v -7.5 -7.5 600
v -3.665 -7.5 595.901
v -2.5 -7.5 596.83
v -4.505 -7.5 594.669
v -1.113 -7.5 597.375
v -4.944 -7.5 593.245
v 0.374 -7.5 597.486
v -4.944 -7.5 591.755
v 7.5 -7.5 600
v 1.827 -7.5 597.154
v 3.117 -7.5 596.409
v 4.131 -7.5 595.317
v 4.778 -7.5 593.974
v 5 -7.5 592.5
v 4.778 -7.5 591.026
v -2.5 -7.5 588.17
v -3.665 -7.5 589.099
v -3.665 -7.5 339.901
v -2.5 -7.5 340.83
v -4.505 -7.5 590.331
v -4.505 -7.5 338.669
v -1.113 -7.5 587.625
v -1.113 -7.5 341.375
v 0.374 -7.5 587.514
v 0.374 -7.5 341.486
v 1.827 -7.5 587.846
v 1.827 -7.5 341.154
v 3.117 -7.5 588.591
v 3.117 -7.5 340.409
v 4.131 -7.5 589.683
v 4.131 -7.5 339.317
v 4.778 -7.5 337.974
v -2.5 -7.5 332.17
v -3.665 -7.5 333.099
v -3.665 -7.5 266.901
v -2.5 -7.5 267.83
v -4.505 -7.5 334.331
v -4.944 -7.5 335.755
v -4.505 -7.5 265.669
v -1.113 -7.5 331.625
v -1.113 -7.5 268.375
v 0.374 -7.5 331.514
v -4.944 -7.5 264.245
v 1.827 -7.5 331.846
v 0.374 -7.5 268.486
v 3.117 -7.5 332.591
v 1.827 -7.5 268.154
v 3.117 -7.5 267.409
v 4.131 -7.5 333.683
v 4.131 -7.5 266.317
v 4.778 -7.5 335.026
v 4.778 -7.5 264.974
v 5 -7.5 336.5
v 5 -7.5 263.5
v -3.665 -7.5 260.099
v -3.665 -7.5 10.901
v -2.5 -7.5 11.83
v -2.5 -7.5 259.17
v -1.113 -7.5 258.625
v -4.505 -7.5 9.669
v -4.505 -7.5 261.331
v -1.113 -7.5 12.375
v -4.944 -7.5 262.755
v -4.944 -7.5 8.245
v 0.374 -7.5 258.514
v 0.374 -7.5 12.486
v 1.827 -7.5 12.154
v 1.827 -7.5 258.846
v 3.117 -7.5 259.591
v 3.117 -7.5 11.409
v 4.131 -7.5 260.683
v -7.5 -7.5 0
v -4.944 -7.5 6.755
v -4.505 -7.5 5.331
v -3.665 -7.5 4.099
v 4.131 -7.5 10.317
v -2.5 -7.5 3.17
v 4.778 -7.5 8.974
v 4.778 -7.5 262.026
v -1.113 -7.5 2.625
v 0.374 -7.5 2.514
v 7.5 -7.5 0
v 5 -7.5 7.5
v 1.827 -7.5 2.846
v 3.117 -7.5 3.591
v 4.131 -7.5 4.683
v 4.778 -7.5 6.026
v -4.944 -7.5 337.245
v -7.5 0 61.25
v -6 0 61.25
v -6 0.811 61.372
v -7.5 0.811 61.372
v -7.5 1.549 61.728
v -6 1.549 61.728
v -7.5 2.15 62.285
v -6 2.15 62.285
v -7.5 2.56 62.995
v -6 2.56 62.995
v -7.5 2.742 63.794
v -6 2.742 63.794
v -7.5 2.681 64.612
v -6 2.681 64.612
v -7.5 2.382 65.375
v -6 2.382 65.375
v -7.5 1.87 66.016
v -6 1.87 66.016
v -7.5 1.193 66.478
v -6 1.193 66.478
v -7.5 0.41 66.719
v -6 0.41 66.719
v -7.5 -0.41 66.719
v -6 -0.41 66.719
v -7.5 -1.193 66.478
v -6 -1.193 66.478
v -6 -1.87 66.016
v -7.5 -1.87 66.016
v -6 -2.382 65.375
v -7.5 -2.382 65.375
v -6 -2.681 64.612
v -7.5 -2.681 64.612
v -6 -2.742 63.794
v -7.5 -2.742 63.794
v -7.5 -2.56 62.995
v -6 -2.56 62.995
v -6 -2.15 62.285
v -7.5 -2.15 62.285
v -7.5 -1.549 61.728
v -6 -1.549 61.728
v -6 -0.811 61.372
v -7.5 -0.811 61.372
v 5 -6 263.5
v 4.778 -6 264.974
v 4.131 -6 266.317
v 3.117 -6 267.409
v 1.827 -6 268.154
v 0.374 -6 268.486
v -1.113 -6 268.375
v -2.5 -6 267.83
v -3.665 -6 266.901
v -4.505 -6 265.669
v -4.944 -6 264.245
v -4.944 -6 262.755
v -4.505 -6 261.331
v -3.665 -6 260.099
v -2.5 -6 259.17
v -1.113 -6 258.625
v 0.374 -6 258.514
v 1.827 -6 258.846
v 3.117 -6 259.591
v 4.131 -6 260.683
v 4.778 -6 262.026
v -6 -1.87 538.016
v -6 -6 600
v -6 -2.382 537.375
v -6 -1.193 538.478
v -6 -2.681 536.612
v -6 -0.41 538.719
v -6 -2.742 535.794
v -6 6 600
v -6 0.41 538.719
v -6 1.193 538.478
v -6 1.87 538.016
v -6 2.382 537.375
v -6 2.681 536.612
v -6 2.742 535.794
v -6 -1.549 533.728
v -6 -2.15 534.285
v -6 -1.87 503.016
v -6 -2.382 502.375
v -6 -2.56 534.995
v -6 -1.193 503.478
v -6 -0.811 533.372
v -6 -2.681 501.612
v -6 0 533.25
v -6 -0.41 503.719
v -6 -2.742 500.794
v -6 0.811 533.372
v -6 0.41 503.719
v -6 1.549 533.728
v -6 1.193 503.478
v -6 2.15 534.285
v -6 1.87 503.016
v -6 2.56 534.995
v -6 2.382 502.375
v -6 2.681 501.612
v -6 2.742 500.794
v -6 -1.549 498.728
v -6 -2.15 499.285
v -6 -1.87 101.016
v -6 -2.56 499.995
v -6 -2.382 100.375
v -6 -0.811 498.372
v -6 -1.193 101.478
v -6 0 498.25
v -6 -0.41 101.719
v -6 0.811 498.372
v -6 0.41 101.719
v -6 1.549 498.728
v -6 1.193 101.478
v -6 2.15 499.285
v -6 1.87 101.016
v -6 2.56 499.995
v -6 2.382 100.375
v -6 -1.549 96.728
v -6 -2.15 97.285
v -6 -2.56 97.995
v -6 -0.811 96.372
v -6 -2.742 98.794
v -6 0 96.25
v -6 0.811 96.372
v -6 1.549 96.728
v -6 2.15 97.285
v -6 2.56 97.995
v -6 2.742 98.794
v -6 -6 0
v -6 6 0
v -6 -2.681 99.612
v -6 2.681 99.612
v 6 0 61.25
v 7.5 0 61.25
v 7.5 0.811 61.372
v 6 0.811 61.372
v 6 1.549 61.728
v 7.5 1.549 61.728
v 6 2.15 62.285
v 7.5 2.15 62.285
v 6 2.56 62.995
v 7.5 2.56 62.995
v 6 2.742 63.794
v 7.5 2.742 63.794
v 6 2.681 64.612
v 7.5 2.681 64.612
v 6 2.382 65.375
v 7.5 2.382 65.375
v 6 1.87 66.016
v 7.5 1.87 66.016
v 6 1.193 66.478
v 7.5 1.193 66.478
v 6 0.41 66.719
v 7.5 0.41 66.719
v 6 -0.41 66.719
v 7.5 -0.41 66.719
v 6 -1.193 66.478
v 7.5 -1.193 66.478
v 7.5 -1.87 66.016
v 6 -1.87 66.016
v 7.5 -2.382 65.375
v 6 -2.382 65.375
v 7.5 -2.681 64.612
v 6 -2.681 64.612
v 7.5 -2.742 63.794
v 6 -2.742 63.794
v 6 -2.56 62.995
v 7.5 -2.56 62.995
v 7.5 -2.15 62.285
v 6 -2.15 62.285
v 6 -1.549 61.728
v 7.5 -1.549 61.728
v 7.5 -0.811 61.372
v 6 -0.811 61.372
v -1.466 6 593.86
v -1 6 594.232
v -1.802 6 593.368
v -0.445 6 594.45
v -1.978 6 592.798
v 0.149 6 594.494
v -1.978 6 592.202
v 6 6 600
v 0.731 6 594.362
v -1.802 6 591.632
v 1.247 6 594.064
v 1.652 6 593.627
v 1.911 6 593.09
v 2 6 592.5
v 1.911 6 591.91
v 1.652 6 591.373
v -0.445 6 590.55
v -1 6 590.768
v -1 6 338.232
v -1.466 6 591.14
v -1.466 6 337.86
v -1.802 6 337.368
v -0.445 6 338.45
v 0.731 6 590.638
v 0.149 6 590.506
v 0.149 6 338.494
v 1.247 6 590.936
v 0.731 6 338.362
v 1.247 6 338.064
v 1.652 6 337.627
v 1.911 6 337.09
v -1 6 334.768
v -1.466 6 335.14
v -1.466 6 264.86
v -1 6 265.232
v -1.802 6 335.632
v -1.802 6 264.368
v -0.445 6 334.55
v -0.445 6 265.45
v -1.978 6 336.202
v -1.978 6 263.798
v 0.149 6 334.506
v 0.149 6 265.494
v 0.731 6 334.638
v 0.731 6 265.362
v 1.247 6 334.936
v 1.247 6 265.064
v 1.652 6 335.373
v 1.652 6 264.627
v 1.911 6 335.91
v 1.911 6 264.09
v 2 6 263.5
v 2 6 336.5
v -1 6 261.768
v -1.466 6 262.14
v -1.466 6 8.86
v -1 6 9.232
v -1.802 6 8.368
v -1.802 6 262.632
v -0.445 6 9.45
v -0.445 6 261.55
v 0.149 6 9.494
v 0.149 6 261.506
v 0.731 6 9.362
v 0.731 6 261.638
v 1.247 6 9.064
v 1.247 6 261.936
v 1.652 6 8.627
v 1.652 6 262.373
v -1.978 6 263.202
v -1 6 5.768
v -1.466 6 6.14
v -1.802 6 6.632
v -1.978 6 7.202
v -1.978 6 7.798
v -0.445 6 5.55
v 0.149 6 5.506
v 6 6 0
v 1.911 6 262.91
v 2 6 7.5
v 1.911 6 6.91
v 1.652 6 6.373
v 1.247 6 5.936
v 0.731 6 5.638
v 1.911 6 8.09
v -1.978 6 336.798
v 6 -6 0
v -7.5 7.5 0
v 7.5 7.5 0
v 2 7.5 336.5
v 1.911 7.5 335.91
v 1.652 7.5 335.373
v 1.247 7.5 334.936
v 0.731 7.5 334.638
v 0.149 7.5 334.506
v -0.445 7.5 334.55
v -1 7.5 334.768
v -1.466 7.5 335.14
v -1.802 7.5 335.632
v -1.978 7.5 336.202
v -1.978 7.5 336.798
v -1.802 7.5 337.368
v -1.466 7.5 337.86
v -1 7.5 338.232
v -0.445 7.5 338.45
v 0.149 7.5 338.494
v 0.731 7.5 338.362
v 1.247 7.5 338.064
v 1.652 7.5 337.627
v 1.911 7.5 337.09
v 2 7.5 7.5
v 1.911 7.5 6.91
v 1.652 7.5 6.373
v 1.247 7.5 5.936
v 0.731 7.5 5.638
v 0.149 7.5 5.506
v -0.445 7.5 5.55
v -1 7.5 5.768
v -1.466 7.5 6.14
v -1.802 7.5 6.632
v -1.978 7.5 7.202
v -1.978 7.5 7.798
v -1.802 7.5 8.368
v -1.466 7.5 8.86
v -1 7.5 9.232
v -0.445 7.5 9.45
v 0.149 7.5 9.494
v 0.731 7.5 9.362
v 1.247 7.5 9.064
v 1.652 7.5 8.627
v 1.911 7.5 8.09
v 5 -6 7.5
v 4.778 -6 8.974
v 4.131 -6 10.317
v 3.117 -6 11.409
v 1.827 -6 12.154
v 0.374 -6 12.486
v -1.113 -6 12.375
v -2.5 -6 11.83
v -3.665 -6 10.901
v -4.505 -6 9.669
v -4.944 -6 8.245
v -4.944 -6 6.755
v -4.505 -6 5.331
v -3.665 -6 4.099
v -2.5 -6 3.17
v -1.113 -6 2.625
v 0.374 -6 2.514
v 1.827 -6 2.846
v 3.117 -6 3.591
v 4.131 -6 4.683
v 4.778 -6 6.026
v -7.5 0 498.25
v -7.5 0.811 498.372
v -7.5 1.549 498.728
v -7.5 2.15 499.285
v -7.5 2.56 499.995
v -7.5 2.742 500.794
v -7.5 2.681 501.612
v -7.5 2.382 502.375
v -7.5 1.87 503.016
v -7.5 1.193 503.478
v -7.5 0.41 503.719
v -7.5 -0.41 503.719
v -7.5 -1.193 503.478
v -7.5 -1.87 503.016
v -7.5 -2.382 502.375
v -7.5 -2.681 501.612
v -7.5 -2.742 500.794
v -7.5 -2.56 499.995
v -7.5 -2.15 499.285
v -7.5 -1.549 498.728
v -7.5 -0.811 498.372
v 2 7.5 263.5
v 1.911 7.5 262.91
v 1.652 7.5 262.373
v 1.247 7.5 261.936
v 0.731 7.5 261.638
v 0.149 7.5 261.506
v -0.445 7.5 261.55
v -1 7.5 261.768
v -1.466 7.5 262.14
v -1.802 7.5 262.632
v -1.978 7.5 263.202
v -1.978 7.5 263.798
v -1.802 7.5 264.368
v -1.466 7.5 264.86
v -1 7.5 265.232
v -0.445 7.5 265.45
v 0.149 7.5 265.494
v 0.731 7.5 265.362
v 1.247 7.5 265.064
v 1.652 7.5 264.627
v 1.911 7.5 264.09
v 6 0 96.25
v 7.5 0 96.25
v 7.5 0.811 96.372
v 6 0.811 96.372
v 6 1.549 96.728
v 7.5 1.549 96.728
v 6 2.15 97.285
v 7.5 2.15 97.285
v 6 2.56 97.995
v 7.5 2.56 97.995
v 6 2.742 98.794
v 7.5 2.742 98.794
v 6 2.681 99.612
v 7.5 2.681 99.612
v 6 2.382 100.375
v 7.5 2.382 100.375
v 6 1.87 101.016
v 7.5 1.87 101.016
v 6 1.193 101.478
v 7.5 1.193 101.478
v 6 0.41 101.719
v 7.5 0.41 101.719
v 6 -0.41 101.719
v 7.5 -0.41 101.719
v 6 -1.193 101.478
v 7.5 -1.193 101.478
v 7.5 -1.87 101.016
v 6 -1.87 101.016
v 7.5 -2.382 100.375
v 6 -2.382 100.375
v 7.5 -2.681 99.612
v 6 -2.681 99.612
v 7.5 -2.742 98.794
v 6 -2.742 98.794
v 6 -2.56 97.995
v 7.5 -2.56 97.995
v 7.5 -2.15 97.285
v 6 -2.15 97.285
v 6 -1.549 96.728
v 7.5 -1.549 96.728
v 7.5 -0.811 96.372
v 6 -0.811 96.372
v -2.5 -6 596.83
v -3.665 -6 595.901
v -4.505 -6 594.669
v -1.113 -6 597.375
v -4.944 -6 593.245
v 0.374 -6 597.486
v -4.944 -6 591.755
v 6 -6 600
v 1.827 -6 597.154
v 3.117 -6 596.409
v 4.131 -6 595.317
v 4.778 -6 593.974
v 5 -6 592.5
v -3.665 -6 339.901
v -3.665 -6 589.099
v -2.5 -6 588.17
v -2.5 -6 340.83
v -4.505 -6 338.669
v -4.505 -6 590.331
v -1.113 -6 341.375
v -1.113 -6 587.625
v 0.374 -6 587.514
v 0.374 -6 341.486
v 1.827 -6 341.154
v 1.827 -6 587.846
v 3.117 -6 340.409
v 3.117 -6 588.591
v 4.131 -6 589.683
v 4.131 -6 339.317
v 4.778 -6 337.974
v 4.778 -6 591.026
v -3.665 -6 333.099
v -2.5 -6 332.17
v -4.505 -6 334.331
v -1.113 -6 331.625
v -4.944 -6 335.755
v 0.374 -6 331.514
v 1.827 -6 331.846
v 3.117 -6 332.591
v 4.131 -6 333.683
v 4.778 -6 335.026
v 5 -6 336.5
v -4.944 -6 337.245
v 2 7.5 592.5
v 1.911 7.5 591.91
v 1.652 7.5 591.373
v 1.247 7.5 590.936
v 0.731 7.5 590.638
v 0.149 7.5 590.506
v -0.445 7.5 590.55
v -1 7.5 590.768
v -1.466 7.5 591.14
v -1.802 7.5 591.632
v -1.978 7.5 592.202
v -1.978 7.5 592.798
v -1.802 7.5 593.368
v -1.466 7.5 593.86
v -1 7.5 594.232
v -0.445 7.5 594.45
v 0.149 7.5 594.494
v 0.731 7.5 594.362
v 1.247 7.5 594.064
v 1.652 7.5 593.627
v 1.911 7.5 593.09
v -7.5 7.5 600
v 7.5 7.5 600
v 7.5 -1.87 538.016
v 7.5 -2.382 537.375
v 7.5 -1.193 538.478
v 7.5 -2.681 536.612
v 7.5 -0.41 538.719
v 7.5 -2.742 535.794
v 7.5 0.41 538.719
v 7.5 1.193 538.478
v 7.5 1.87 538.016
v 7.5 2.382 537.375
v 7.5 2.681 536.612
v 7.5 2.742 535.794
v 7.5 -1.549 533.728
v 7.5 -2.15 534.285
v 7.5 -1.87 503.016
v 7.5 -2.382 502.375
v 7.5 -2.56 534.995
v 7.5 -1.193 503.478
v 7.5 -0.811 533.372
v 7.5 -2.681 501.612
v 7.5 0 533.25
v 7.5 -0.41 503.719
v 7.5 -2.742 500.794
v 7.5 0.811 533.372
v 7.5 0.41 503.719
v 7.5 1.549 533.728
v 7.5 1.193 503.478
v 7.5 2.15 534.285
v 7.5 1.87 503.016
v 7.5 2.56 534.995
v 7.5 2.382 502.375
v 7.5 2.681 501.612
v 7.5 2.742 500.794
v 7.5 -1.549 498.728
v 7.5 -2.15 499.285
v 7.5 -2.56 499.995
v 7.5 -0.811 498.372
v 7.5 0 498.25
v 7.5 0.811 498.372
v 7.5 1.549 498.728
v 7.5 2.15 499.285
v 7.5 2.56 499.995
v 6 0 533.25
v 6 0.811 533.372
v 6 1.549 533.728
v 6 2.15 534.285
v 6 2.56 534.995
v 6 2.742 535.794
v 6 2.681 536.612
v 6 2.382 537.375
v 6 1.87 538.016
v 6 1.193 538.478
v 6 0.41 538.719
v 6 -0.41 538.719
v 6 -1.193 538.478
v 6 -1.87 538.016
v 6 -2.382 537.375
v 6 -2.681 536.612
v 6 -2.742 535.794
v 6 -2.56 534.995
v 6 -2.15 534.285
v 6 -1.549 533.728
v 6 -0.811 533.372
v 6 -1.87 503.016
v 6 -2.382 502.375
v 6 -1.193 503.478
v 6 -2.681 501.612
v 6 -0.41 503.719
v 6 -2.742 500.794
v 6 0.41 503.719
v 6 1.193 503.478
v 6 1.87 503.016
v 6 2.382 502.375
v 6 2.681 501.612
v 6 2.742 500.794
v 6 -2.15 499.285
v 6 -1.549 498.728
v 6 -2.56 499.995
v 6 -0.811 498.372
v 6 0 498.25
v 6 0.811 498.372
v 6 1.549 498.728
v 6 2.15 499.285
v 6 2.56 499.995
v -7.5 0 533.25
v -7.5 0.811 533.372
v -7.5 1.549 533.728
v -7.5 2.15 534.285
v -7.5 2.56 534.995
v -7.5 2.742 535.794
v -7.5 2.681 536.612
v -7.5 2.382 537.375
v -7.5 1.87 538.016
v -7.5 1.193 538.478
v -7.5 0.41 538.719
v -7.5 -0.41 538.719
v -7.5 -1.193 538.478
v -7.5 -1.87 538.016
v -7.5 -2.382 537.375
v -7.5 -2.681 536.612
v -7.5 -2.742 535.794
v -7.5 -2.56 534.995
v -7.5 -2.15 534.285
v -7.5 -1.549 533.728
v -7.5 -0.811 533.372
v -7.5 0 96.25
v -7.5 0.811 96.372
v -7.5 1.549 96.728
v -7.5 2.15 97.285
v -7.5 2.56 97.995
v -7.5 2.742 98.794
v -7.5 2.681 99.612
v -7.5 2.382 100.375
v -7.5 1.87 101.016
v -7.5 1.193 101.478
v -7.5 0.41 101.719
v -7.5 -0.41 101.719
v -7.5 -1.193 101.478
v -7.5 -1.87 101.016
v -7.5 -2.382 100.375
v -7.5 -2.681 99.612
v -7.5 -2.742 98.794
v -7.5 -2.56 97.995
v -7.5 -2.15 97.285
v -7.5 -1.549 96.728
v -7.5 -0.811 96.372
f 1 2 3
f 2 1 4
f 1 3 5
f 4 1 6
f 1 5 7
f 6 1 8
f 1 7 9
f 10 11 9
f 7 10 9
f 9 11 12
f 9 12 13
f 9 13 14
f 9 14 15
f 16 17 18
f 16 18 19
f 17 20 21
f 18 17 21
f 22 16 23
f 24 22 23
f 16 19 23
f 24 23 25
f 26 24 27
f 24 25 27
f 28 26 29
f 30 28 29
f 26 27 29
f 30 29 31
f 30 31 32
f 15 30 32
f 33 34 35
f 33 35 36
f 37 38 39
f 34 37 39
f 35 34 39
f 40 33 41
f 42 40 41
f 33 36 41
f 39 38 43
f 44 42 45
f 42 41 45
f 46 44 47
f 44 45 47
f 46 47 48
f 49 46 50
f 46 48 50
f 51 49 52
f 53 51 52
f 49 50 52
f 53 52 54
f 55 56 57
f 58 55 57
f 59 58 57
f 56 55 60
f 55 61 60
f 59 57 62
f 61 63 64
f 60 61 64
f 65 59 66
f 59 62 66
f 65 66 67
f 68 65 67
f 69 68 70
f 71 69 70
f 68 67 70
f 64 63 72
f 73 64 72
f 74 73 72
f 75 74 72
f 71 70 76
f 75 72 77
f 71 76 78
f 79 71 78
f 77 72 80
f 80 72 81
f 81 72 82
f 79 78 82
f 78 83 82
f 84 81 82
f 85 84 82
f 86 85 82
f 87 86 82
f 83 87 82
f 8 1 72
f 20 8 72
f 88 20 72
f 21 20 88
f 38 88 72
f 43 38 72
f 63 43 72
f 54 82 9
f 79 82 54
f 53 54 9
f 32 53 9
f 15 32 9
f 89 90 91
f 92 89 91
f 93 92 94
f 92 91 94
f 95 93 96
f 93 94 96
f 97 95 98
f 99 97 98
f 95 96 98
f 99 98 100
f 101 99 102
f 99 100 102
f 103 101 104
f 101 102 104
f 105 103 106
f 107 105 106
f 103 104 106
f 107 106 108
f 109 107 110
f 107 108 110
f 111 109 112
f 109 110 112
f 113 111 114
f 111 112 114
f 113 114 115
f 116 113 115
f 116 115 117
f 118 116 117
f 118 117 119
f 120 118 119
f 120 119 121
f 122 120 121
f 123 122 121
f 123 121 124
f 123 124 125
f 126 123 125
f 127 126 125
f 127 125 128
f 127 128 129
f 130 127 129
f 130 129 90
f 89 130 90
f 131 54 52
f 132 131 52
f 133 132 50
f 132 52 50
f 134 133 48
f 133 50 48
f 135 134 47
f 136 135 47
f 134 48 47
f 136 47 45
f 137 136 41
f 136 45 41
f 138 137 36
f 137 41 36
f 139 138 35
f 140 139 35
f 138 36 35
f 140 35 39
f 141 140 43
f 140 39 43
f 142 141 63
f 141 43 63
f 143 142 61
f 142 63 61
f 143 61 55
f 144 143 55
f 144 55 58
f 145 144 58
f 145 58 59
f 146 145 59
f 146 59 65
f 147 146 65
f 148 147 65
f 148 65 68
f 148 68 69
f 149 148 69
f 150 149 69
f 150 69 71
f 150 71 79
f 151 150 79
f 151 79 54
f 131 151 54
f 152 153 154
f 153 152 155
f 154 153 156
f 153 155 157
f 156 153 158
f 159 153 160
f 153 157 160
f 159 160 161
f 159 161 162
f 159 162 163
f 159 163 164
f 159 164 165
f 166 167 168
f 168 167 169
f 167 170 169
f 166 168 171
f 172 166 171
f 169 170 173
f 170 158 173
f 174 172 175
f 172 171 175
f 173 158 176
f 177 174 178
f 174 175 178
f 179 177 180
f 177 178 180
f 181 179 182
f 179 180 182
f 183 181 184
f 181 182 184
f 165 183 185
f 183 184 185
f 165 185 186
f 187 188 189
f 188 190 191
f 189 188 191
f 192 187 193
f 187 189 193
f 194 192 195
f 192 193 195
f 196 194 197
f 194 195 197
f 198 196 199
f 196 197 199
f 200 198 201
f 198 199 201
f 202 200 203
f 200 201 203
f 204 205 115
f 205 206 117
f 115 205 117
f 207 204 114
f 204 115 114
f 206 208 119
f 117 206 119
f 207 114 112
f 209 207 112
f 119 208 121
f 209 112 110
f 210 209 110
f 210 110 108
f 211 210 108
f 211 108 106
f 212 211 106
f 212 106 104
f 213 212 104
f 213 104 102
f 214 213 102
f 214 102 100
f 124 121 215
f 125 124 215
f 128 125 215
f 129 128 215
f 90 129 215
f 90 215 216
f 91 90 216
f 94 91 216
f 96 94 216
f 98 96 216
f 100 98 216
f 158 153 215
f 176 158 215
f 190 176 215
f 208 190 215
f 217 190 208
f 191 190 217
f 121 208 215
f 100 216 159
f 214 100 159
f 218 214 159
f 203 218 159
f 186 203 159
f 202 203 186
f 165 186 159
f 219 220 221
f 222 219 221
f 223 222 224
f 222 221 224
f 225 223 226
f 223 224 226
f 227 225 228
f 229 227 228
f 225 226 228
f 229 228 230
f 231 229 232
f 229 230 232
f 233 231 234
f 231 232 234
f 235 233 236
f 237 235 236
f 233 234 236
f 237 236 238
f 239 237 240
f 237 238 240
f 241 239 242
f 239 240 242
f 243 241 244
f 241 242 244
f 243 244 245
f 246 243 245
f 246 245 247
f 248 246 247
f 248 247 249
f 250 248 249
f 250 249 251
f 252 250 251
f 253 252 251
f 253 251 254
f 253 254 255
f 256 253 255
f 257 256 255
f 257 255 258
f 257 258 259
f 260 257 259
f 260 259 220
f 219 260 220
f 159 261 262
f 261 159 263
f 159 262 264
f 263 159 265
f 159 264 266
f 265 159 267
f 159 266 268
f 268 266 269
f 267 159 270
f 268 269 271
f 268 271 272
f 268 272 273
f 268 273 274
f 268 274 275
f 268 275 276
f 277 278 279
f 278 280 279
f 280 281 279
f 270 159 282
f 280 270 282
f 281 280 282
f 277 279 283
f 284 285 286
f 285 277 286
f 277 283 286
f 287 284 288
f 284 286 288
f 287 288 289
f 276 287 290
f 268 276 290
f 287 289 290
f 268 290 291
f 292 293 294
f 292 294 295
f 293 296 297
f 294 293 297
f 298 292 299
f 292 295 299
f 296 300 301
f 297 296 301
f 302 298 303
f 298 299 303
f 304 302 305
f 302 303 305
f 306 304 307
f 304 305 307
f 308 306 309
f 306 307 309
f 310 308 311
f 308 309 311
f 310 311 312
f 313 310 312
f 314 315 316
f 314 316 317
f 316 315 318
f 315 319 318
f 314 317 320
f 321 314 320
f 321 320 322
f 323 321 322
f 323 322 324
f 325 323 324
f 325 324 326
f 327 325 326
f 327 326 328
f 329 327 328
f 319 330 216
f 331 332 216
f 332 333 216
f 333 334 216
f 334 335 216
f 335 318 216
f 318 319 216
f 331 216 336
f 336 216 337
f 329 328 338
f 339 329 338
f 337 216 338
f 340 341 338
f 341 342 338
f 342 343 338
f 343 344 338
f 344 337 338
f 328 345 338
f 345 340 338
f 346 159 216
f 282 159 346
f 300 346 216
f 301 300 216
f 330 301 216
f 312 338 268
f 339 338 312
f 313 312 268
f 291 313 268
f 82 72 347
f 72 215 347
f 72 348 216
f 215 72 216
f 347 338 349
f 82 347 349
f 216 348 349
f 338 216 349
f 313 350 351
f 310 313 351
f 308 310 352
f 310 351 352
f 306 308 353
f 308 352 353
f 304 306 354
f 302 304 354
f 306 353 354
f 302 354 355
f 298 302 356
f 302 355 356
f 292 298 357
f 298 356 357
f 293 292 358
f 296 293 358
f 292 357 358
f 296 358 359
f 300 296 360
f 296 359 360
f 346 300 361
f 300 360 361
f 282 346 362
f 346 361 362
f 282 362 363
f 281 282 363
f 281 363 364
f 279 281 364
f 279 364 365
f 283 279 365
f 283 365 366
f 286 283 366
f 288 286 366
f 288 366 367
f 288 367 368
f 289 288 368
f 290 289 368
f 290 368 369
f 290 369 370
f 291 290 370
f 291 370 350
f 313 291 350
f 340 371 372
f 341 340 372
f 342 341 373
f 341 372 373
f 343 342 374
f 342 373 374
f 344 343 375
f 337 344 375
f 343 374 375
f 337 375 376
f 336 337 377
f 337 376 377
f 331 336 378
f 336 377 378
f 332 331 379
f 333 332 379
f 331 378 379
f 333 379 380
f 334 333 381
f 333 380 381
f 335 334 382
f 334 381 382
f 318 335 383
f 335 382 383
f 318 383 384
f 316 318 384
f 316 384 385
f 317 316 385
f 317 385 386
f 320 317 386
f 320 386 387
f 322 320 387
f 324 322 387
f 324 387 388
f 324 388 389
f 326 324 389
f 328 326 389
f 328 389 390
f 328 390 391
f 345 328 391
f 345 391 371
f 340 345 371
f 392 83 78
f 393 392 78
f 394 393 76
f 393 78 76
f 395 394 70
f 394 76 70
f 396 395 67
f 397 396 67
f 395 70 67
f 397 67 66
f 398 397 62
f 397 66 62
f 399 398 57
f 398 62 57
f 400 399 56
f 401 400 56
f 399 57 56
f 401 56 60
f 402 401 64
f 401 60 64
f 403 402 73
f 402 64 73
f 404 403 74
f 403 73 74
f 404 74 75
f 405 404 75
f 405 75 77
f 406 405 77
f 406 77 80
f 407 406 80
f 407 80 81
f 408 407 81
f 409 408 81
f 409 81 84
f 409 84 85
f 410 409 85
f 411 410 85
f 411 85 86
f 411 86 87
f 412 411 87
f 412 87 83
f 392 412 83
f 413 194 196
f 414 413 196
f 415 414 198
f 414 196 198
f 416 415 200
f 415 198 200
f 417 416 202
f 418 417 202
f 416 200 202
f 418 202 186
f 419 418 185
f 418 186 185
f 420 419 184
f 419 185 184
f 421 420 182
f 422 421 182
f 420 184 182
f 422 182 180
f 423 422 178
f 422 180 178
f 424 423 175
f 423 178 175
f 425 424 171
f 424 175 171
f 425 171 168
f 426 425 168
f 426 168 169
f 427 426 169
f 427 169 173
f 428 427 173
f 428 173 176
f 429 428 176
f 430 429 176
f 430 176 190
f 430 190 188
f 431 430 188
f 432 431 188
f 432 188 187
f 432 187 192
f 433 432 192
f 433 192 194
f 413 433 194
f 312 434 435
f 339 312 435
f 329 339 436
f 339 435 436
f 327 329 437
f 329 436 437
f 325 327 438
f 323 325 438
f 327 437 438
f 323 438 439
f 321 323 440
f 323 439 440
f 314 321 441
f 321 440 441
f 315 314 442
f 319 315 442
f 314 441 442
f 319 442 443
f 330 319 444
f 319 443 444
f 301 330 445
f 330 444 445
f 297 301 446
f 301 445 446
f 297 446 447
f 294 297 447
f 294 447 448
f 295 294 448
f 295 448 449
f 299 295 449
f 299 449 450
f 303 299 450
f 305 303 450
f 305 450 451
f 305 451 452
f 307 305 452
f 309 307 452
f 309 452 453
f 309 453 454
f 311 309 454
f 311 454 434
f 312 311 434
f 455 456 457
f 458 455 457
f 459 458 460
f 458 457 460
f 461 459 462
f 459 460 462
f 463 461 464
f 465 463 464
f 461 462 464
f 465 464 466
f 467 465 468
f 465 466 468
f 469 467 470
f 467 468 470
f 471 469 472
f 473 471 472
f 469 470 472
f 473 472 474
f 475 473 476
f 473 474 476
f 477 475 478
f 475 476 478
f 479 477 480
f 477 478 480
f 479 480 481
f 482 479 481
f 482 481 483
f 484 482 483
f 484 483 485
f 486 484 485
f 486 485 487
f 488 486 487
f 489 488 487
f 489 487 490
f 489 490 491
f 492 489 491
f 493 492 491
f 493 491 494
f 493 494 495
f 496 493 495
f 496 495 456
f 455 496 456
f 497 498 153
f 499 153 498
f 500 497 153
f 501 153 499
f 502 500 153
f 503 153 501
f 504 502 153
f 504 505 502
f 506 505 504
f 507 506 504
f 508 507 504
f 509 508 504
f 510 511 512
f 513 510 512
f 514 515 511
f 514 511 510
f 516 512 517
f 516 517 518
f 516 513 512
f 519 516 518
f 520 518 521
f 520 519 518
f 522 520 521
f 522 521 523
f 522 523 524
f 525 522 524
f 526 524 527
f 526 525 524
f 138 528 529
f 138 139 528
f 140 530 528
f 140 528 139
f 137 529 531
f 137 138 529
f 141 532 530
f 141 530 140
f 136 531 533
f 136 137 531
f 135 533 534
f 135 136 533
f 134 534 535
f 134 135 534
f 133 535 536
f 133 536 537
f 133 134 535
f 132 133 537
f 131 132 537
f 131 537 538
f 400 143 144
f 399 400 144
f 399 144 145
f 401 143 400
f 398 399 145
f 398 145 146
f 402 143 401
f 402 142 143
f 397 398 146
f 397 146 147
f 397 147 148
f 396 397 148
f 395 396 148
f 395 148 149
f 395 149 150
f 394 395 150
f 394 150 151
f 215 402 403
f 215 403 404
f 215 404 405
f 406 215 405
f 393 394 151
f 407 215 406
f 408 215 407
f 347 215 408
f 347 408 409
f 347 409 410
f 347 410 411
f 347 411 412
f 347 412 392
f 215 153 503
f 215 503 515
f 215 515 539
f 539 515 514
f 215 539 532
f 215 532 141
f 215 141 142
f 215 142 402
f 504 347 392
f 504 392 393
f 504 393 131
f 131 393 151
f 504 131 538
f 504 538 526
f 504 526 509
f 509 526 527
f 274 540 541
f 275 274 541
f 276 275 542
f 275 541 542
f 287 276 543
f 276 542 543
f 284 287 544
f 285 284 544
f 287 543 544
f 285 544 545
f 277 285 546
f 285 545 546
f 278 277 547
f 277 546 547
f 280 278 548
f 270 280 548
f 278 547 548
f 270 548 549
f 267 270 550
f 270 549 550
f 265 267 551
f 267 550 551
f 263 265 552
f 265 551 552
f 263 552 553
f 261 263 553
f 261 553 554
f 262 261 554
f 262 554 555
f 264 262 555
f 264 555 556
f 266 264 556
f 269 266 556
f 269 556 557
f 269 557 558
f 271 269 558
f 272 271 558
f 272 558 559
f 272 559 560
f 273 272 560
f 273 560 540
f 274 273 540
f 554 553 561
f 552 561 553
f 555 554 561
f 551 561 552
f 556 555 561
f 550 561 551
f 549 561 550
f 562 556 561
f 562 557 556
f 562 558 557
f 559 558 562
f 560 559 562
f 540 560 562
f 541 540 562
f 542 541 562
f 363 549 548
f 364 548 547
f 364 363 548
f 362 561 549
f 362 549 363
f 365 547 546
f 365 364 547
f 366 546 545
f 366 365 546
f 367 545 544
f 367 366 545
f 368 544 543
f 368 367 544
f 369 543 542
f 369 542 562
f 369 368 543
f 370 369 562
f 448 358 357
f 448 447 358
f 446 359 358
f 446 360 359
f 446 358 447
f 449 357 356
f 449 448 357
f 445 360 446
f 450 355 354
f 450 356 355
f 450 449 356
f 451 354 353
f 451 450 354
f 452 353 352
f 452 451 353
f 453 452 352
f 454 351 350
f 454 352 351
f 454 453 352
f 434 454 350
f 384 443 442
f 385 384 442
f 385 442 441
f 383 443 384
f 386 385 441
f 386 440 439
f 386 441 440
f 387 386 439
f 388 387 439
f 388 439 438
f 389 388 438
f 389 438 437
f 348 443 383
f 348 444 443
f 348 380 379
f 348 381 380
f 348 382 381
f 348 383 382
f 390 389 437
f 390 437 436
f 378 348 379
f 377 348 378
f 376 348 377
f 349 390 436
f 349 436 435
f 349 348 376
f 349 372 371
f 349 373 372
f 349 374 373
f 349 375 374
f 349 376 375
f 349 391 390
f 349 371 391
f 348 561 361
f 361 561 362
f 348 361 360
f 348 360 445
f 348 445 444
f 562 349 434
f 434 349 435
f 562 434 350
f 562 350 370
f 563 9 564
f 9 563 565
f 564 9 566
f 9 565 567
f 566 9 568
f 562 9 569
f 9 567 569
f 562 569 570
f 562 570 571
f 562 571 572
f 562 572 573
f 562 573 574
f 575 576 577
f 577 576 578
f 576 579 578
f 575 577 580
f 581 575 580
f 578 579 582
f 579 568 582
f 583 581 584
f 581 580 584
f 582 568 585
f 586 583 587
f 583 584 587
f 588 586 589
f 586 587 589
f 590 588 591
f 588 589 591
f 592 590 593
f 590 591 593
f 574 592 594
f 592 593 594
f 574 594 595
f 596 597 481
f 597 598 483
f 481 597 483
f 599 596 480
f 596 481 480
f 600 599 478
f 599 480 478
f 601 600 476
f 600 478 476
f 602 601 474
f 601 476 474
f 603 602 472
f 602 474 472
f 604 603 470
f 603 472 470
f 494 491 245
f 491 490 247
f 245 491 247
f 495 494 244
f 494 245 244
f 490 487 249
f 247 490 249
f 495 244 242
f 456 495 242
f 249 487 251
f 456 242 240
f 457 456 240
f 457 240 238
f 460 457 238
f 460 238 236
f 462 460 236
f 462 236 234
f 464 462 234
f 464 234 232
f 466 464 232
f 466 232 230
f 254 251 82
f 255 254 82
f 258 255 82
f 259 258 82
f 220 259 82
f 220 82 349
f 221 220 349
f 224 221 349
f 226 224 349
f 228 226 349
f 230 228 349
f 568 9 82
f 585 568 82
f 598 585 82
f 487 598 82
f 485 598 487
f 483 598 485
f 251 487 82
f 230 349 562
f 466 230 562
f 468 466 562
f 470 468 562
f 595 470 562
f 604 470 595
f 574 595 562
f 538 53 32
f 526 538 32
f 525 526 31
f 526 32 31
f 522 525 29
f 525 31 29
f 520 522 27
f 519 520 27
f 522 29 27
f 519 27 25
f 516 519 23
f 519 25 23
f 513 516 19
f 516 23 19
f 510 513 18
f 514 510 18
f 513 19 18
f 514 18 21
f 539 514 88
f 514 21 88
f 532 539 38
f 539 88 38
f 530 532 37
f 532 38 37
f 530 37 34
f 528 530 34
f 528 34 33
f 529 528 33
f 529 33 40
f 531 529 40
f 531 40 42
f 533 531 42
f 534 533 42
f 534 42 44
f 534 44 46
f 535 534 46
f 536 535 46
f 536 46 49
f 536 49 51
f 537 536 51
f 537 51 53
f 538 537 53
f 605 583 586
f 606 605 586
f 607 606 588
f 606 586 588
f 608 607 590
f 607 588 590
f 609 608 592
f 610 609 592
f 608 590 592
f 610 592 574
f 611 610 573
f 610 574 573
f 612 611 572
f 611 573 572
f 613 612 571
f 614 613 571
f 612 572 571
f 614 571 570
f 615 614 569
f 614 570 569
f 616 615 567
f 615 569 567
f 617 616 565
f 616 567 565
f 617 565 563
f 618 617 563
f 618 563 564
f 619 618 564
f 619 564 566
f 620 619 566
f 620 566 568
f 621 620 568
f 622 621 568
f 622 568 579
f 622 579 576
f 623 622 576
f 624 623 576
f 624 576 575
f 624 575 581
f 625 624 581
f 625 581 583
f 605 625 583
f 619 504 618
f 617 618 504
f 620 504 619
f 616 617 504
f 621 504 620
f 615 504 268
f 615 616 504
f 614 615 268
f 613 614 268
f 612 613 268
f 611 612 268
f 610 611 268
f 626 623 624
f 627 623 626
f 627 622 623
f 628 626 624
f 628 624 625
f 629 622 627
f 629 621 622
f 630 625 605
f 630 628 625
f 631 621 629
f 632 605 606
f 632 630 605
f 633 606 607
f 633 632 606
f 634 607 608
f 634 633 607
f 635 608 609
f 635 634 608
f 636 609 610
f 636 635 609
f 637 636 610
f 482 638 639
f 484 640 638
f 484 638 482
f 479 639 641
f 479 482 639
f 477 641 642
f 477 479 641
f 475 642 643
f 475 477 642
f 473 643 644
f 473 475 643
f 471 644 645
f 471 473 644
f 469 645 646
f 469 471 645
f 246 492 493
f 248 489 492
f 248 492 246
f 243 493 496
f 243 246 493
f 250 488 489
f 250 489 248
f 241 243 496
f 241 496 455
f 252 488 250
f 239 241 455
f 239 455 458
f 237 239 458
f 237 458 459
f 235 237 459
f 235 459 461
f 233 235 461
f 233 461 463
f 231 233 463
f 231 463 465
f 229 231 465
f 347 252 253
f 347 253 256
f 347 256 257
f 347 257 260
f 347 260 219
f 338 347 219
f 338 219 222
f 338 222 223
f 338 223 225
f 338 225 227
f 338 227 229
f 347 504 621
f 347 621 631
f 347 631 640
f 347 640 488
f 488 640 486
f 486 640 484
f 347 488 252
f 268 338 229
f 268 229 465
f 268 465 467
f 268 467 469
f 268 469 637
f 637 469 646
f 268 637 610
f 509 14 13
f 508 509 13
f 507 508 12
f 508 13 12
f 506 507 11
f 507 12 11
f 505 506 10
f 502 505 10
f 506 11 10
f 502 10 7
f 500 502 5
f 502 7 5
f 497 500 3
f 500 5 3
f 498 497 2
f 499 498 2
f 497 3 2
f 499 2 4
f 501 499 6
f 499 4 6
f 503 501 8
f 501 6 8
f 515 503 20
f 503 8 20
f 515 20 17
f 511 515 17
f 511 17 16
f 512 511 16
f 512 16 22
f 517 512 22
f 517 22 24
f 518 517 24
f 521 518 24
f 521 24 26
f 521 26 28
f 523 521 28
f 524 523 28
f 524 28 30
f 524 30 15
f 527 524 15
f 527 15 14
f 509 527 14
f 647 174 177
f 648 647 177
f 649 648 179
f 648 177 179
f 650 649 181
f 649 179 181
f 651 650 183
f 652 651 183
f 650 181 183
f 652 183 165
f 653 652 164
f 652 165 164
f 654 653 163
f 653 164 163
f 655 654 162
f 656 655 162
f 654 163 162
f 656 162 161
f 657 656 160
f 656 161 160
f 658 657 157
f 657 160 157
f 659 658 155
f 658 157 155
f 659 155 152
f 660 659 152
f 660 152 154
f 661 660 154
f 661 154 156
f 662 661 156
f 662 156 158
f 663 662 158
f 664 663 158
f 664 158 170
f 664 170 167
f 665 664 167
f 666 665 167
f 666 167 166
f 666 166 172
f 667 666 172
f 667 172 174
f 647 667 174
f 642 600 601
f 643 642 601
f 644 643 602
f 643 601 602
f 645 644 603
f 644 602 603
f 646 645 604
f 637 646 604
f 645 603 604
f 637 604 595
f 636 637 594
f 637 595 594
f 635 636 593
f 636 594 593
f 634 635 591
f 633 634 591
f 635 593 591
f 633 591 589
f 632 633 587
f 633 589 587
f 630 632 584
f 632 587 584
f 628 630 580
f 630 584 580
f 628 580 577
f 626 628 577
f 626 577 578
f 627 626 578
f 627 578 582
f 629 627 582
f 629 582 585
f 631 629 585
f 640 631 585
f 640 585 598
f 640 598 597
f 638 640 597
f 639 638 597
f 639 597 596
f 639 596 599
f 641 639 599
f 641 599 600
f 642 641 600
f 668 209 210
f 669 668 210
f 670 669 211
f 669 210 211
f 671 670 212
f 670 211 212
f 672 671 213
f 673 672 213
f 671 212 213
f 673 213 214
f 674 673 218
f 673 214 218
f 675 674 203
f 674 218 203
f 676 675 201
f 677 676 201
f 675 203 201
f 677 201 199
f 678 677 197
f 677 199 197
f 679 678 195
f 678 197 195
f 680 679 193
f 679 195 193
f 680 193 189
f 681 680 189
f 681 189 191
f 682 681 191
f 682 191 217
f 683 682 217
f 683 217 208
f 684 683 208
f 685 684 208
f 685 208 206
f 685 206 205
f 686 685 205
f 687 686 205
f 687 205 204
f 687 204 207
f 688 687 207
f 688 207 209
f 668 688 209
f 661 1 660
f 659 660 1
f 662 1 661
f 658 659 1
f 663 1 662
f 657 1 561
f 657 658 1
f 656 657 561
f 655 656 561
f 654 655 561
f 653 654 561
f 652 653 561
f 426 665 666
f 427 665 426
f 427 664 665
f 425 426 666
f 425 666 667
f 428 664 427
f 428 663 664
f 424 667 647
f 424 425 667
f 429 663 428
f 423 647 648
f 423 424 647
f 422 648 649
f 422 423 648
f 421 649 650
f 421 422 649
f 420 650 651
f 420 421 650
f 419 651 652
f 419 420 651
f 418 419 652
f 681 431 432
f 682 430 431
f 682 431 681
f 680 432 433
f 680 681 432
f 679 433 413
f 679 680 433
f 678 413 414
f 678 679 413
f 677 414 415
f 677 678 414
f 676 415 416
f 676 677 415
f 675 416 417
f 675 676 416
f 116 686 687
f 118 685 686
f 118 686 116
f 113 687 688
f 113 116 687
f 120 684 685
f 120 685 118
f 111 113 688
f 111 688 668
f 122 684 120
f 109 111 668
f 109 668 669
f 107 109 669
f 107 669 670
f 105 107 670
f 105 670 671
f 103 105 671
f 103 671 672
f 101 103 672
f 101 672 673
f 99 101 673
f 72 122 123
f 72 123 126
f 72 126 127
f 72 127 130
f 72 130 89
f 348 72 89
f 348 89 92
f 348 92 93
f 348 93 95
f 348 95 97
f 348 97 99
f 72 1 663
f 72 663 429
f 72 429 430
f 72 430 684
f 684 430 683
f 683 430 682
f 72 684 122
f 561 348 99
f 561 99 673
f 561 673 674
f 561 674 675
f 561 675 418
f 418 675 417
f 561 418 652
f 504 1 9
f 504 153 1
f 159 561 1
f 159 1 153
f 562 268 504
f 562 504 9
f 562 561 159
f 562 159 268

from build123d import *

# Parameters (mm, degrees)
SKETCH_1_W          = 15
SKETCH_1_H          = 15
SKETCH_1_W_2        = 12
SKETCH_1_H_2        = 12
EXTRUDE_1_DEPTH     = 600
SKETCH_3_R          = 2
CUT_EXTRUDE_2_DEPTH = 25
SKETCH_4_R          = 2.75
CUT_EXTRUDE_3_DEPTH = 20
SKETCH_6_R          = 2
CUT_EXTRUDE_4_DEPTH = 20
SKETCH_9_R          = 5
CUT_EXTRUDE_7_DEPTH = 10


with BuildPart() as part:
    # ｽｹｯﾁ1 → ﾎﾞｽ - 押し出し1 (new body)
    with BuildSketch(Plane.XY):
        Rectangle(SKETCH_1_W, SKETCH_1_H)
        Rectangle(SKETCH_1_W_2, SKETCH_1_H_2, mode=Mode.SUBTRACT)
    extrude(amount=EXTRUDE_1_DEPTH)

    # ｽｹｯﾁ3 → ｶｯﾄ - 押し出し2 (cut)
    with BuildSketch(Plane(origin=(0, 7.5, 0), x_dir=(1, 0, 0), z_dir=(0, 1, 0))):
        with Locations((0, -7.5)):
            Circle(SKETCH_3_R)
        with Locations((0, -592.5)):
            Circle(SKETCH_3_R)
    extrude(amount=-CUT_EXTRUDE_2_DEPTH, mode=Mode.SUBTRACT)

    # ｽｹｯﾁ4 → ｶｯﾄ - 押し出し3 (cut)
    with BuildSketch(Plane(origin=(7.5, 0, 0), x_dir=(0, 0, -1), z_dir=(1, 0, 0))):
        with Locations((-536, 0)):
            Circle(SKETCH_4_R)
        with Locations((-501, 0)):
            Circle(SKETCH_4_R)
        with Locations((-99, 0)):
            Circle(SKETCH_4_R)
        with Locations((-64, 0)):
            Circle(SKETCH_4_R)
    extrude(amount=-CUT_EXTRUDE_3_DEPTH, mode=Mode.SUBTRACT)

    # ｽｹｯﾁ6 → ｶｯﾄ - 押し出し4 (cut)
    with BuildSketch(Plane(origin=(0, 7.5, 0), x_dir=(1, 0, 0), z_dir=(0, 1, 0))):
        with Locations((0, -336.5)):
            Circle(SKETCH_6_R)
        with Locations((0, -263.5)):
            Circle(SKETCH_6_R)
    extrude(amount=-CUT_EXTRUDE_4_DEPTH, mode=Mode.SUBTRACT)

    # ｽｹｯﾁ9 → ｶｯﾄ - 押し出し7 (cut)
    with BuildSketch(Plane.XZ.offset(7.5)):
        with Locations((0, 592.5)):
            Circle(SKETCH_9_R)
        with Locations((0, 336.5)):
            Circle(SKETCH_9_R)
        with Locations((0, 263.5)):
            Circle(SKETCH_9_R)
        with Locations((0, 7.5)):
            Circle(SKETCH_9_R)
    extrude(amount=-CUT_EXTRUDE_7_DEPTH, mode=Mode.SUBTRACT)


solid = part.part
